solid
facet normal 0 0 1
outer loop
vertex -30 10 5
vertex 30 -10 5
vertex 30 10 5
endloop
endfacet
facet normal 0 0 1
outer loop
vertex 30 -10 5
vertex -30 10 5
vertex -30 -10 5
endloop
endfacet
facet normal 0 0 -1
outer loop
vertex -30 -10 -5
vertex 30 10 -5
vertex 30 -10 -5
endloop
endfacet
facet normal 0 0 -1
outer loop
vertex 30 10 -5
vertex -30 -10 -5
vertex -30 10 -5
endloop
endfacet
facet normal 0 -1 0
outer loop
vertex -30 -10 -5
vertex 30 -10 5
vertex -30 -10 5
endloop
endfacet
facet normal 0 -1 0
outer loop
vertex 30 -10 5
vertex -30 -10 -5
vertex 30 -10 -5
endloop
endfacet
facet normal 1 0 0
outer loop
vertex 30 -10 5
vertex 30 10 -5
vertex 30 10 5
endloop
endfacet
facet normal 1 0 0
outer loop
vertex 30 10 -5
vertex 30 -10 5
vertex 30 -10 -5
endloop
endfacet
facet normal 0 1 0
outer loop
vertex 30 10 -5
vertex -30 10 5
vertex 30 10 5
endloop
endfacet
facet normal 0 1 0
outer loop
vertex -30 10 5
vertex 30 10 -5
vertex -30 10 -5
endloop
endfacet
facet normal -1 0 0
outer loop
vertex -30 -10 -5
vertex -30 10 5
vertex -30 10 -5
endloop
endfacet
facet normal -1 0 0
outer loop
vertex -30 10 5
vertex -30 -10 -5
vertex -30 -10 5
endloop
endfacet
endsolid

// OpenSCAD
// //$fa = 0.1;
// //$fs = 0.04;
// //我是注释
// $fa = 0.1;
// $fs = 0.04;
// cube([60,20,10],center=true);
// translate([5,0,10 - 0.001])
//     cube([30,20,10],center=true);
// translate([-20,-15,0])
//     rotate([90,0,0])
//     cylinder(h=3,r=8,center=true);
// translate([-20,15,0])
//     rotate([90,0,0])
//     cylinder(h=3,r=8,center=true);
// translate([20,-15,0])
//     rotate([90,0,0])
//     cylinder(h=3,r=8,center=true);
// translate([20,15,0])
//     rotate([90,0,0])
//     cylinder(h=3,r=8,center=true);
// translate([-20,0,0])
//     rotate([90,0,0])
//     cylinder(h=30,r=2,center=true);
// translate([20,0,0])
//     rotate([90,0,0])
//     cylinder(h=30,r=2,center=true);
// rotate([90,0,0])
// cylinder(h=10,r=10);
scale([1,1,1])
    cube([60,20,10],center=true);
